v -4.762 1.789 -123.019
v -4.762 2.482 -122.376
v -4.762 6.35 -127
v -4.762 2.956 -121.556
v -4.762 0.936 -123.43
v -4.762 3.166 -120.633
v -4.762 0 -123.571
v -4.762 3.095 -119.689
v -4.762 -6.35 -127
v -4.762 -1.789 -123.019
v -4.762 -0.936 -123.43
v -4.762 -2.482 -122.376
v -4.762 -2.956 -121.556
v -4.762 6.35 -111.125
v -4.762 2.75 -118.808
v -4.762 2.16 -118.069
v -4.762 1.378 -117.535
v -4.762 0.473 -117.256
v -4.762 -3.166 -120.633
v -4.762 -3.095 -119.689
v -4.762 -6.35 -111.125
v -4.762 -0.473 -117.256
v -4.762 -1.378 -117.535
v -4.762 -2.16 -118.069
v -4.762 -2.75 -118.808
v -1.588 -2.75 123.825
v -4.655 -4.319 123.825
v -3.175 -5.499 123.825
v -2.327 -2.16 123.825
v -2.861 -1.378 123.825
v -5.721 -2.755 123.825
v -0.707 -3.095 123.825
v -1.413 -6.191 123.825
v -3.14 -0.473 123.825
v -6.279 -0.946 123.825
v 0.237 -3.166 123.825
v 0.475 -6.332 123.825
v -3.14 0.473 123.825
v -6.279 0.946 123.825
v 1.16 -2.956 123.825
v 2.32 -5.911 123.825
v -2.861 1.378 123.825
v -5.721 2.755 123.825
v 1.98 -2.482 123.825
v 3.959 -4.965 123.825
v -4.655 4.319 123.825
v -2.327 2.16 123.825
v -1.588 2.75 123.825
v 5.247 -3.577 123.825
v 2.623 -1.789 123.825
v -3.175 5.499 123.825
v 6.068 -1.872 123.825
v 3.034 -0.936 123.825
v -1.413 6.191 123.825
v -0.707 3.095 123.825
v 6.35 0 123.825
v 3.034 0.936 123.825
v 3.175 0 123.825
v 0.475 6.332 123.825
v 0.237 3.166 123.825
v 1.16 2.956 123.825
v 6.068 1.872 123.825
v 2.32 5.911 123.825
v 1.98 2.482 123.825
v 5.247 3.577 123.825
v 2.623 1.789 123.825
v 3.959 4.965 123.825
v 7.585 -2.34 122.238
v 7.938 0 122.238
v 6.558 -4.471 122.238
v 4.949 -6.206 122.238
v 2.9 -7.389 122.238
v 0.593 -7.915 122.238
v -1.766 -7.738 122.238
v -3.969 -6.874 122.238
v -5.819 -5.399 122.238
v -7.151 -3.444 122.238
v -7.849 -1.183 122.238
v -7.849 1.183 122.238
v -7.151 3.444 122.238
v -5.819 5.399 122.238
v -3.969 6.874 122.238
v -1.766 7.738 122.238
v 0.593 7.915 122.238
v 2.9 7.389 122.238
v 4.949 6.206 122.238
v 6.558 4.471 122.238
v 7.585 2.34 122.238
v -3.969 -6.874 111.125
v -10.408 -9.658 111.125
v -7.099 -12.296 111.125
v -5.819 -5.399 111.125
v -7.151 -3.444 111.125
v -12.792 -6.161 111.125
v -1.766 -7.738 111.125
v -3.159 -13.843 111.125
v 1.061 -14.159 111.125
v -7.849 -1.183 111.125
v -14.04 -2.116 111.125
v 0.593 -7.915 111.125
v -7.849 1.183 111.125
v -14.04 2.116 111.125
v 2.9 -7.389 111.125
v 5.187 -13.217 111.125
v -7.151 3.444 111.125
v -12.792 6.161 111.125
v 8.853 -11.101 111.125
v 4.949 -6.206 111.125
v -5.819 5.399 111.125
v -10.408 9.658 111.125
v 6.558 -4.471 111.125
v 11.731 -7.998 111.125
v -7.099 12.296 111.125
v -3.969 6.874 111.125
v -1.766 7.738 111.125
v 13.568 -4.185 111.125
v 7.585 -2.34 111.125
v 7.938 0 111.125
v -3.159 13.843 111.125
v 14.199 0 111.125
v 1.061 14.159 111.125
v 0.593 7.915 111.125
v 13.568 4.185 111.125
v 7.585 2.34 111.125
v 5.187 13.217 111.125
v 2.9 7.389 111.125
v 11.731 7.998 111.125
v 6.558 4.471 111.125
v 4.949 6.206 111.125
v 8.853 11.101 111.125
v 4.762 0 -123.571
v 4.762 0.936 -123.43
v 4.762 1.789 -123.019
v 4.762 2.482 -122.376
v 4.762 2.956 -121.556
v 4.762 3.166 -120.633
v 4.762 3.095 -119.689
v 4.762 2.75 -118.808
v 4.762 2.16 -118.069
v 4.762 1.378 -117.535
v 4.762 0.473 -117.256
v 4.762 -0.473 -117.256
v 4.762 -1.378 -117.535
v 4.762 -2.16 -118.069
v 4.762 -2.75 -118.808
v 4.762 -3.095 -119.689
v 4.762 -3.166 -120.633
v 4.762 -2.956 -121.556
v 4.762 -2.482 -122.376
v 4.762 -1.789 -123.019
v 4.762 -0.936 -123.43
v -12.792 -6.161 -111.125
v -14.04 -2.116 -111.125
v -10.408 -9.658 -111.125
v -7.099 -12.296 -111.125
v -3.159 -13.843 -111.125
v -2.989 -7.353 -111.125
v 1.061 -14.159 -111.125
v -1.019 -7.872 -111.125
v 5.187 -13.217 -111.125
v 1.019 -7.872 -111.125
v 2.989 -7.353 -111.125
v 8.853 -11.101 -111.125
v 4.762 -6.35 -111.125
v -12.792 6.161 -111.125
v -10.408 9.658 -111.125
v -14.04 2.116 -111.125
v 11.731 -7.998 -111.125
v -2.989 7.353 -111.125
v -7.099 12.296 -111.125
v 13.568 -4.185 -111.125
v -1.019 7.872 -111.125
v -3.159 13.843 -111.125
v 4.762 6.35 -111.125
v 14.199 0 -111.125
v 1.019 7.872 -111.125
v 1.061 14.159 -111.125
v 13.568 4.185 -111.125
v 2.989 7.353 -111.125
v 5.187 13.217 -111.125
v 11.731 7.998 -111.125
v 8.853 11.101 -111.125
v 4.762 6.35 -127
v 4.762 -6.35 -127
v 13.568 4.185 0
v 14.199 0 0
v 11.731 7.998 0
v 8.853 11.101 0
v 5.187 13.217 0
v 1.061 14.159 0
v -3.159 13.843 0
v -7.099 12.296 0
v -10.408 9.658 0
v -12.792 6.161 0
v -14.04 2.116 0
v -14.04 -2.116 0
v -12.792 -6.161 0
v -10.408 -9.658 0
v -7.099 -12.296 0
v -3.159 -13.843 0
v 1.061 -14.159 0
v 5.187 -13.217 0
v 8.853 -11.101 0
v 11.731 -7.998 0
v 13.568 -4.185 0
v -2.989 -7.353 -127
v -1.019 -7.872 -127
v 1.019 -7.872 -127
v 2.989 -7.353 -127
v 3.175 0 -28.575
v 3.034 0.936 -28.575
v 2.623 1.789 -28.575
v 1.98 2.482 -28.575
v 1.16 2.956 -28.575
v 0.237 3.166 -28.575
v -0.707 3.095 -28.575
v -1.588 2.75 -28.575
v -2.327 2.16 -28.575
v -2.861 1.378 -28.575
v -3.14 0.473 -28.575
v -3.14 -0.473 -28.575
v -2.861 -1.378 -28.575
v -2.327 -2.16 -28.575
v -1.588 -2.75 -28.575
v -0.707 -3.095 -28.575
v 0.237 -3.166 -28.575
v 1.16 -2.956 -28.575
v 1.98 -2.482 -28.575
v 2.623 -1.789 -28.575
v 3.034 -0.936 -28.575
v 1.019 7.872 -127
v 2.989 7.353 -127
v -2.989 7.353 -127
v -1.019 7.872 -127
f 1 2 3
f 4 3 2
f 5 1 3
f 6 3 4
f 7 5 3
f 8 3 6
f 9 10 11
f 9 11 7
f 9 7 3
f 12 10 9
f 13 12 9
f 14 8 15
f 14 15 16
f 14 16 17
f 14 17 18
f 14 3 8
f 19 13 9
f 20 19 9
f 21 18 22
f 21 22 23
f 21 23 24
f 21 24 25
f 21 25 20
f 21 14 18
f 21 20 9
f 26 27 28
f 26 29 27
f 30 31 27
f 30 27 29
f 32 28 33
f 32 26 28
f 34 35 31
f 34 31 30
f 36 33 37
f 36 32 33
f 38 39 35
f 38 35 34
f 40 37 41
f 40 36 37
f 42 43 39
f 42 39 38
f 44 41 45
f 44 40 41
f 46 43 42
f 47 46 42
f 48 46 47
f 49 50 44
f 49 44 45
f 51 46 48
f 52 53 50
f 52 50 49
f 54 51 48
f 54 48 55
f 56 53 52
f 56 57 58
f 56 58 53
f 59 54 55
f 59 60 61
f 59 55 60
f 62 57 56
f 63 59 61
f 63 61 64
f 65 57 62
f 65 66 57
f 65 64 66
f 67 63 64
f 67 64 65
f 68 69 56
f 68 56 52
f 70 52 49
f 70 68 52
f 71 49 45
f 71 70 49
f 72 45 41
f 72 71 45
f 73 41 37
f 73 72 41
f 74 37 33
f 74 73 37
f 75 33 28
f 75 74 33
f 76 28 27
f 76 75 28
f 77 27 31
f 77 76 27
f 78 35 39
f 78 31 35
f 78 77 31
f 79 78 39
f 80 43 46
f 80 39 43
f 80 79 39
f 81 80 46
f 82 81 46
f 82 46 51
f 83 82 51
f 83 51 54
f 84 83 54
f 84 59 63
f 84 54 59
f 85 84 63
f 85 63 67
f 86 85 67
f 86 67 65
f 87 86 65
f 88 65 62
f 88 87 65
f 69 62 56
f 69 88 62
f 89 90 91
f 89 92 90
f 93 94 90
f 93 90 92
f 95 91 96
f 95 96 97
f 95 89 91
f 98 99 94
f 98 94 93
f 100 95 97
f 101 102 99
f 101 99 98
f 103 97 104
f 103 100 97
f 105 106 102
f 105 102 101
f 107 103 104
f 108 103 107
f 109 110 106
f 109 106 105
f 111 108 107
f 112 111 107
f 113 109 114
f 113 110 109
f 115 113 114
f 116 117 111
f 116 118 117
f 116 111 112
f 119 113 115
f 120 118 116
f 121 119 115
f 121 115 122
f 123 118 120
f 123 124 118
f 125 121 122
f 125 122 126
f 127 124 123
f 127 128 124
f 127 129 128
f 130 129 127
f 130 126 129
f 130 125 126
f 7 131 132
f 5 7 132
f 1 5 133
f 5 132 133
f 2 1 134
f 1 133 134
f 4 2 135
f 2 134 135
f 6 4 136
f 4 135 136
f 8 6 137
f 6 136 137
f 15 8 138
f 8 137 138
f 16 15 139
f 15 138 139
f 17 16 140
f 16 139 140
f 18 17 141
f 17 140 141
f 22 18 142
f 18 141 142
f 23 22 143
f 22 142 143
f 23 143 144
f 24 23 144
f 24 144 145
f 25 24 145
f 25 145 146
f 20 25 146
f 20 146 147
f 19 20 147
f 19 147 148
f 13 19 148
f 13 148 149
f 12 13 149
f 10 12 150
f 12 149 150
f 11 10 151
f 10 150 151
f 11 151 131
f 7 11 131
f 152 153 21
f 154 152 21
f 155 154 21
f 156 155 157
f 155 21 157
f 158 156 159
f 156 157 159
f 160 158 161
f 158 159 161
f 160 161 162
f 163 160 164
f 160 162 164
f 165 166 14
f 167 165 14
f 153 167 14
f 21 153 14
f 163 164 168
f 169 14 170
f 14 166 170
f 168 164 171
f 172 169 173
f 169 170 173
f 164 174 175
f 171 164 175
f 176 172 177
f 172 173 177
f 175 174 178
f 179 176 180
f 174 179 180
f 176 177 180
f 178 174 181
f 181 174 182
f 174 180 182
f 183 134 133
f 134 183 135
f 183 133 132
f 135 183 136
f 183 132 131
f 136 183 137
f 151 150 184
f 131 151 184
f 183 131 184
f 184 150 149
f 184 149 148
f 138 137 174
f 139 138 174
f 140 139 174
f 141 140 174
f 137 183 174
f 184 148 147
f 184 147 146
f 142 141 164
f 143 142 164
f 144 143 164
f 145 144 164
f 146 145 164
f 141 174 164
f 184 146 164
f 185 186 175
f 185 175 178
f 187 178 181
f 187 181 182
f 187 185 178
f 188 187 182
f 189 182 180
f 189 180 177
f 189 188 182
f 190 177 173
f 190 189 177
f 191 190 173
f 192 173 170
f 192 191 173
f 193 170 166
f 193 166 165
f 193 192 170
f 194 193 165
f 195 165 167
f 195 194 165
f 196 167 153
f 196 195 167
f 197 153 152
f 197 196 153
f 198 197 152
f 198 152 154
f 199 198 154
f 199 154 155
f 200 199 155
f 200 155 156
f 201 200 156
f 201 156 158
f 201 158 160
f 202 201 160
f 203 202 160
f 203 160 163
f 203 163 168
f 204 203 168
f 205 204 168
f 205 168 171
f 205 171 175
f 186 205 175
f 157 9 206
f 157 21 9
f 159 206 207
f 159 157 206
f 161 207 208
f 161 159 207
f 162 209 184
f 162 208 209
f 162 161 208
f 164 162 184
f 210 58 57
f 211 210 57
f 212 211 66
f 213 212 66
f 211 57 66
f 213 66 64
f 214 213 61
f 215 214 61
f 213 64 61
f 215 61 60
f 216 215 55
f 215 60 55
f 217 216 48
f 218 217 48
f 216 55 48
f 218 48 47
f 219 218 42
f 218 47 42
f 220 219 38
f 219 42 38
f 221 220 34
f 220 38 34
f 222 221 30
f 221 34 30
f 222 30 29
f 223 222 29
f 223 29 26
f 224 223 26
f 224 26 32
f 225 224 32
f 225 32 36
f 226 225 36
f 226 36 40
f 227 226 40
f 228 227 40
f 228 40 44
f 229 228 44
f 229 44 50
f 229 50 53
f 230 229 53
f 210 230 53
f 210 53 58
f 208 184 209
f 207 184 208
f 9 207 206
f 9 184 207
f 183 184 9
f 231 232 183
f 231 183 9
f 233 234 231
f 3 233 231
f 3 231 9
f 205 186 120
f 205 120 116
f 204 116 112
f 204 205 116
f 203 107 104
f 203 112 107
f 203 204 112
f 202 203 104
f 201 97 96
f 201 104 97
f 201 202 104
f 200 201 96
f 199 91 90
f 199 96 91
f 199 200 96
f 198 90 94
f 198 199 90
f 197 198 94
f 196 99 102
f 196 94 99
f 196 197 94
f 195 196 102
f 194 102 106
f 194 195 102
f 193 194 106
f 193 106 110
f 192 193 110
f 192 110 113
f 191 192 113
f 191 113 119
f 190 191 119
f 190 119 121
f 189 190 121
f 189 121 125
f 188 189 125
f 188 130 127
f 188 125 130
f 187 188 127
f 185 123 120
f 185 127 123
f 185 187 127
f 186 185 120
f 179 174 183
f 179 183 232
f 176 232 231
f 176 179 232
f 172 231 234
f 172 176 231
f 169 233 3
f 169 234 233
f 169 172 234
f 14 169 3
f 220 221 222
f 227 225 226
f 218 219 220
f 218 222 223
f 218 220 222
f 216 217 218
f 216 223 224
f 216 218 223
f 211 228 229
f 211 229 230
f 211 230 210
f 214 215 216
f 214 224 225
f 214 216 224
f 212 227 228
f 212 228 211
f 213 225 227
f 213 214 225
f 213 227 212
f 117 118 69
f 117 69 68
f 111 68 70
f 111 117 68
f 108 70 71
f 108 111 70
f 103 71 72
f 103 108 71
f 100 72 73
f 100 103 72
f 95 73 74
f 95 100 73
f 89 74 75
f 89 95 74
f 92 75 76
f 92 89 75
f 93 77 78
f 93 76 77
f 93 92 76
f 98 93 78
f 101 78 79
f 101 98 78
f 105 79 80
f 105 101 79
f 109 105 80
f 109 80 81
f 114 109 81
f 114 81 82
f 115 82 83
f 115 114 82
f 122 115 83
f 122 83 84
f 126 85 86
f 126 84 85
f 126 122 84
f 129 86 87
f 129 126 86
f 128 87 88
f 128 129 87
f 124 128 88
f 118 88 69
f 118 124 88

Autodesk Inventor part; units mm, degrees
ref_plane "YZ Plane" through (0, 0, 0) normal (1, 0, 0) x (0, 1, 0)
ref_plane "XZ Plane" through (0, 0, 0) normal (0, 1, 0) x (-1, 0, 0)
ref_plane "XY Plane" through (0, 0, 0) normal (0, 0, 1) x (1, 0, 0)
sketch "Sketch1" plane through (0, 0, 0) normal (0, 0, 1) x (1, 0, 0)
  circle A0 centre (0, 0) radius 14.1986
  dimension "d0" = 28.3972
extrude "Extrusion1" add sketch "Sketch1" along normal mid plane 222.25
sketch "Sketch2" plane through (0, 0, -111.125) normal (0, 0, -1) x (-1, 0, 0)
  arc A0 (4.7625, 6.35) -> (-4.7625, 6.35) centre (0, 0) ccw
  arc A1 (-4.7625, -6.35) -> (4.7625, -6.35) centre (0, 0) ccw
  line L0 (-4.7625, 6.35) -> (-4.7625, -6.35)
  line L1 (4.7625, 6.35) -> (4.7625, -6.35)
  line L2 (4.7625, 0) -> (-4.7625, 0) construction
  dimension "d3" = 9.525
  dimension "d4" = 7.9375
extrude "Extrusion2" add sketch "Sketch2" along normal blind 15.875
sketch "Sketch3" plane through (4.7625, -6.35, -111.125) normal (1, 0, 0) x (0, 0, -1)
  line L0 (15.875, 12.7) -> (15.875, 0) construction
  line L1 (15.875, 6.35) -> (0, 6.35) construction
  line L2 (0, -7.8486) -> (0, 20.5486) construction
  circle A0 centre (9.271, 6.35) radius 3.175
  point P0 (-111.125, 6.35)
  dimension "d7" = 6.604
  dimension "d8" = 6.35
extrude "Extrusion3" cut sketch "Sketch3" against normal through all
sketch "Sketch4" plane through (0, 0, 111.125) normal (0, 0, 1) x (1, 0, 0)
  circle A0 centre (0, 0) radius 7.9375
  dimension "d11" = 15.875
extrude "Extrusion4" add sketch "Sketch4" along normal blind 12.7
chamfer "Chamfer1" distance 1.5875 angle 45 1 edges at (-7.9375, 0, 123.825)
sketch "Sketch5" plane through (0, 0, 123.825) normal (0, 0, 1) x (1, 0, 0)
  circle A0 centre (0, 0) radius 3.175
  dimension "d17" = 6.35
extrude "Extrusion5" cut sketch "Sketch5" against normal blind 152.4
properties part number "cylinder body"
